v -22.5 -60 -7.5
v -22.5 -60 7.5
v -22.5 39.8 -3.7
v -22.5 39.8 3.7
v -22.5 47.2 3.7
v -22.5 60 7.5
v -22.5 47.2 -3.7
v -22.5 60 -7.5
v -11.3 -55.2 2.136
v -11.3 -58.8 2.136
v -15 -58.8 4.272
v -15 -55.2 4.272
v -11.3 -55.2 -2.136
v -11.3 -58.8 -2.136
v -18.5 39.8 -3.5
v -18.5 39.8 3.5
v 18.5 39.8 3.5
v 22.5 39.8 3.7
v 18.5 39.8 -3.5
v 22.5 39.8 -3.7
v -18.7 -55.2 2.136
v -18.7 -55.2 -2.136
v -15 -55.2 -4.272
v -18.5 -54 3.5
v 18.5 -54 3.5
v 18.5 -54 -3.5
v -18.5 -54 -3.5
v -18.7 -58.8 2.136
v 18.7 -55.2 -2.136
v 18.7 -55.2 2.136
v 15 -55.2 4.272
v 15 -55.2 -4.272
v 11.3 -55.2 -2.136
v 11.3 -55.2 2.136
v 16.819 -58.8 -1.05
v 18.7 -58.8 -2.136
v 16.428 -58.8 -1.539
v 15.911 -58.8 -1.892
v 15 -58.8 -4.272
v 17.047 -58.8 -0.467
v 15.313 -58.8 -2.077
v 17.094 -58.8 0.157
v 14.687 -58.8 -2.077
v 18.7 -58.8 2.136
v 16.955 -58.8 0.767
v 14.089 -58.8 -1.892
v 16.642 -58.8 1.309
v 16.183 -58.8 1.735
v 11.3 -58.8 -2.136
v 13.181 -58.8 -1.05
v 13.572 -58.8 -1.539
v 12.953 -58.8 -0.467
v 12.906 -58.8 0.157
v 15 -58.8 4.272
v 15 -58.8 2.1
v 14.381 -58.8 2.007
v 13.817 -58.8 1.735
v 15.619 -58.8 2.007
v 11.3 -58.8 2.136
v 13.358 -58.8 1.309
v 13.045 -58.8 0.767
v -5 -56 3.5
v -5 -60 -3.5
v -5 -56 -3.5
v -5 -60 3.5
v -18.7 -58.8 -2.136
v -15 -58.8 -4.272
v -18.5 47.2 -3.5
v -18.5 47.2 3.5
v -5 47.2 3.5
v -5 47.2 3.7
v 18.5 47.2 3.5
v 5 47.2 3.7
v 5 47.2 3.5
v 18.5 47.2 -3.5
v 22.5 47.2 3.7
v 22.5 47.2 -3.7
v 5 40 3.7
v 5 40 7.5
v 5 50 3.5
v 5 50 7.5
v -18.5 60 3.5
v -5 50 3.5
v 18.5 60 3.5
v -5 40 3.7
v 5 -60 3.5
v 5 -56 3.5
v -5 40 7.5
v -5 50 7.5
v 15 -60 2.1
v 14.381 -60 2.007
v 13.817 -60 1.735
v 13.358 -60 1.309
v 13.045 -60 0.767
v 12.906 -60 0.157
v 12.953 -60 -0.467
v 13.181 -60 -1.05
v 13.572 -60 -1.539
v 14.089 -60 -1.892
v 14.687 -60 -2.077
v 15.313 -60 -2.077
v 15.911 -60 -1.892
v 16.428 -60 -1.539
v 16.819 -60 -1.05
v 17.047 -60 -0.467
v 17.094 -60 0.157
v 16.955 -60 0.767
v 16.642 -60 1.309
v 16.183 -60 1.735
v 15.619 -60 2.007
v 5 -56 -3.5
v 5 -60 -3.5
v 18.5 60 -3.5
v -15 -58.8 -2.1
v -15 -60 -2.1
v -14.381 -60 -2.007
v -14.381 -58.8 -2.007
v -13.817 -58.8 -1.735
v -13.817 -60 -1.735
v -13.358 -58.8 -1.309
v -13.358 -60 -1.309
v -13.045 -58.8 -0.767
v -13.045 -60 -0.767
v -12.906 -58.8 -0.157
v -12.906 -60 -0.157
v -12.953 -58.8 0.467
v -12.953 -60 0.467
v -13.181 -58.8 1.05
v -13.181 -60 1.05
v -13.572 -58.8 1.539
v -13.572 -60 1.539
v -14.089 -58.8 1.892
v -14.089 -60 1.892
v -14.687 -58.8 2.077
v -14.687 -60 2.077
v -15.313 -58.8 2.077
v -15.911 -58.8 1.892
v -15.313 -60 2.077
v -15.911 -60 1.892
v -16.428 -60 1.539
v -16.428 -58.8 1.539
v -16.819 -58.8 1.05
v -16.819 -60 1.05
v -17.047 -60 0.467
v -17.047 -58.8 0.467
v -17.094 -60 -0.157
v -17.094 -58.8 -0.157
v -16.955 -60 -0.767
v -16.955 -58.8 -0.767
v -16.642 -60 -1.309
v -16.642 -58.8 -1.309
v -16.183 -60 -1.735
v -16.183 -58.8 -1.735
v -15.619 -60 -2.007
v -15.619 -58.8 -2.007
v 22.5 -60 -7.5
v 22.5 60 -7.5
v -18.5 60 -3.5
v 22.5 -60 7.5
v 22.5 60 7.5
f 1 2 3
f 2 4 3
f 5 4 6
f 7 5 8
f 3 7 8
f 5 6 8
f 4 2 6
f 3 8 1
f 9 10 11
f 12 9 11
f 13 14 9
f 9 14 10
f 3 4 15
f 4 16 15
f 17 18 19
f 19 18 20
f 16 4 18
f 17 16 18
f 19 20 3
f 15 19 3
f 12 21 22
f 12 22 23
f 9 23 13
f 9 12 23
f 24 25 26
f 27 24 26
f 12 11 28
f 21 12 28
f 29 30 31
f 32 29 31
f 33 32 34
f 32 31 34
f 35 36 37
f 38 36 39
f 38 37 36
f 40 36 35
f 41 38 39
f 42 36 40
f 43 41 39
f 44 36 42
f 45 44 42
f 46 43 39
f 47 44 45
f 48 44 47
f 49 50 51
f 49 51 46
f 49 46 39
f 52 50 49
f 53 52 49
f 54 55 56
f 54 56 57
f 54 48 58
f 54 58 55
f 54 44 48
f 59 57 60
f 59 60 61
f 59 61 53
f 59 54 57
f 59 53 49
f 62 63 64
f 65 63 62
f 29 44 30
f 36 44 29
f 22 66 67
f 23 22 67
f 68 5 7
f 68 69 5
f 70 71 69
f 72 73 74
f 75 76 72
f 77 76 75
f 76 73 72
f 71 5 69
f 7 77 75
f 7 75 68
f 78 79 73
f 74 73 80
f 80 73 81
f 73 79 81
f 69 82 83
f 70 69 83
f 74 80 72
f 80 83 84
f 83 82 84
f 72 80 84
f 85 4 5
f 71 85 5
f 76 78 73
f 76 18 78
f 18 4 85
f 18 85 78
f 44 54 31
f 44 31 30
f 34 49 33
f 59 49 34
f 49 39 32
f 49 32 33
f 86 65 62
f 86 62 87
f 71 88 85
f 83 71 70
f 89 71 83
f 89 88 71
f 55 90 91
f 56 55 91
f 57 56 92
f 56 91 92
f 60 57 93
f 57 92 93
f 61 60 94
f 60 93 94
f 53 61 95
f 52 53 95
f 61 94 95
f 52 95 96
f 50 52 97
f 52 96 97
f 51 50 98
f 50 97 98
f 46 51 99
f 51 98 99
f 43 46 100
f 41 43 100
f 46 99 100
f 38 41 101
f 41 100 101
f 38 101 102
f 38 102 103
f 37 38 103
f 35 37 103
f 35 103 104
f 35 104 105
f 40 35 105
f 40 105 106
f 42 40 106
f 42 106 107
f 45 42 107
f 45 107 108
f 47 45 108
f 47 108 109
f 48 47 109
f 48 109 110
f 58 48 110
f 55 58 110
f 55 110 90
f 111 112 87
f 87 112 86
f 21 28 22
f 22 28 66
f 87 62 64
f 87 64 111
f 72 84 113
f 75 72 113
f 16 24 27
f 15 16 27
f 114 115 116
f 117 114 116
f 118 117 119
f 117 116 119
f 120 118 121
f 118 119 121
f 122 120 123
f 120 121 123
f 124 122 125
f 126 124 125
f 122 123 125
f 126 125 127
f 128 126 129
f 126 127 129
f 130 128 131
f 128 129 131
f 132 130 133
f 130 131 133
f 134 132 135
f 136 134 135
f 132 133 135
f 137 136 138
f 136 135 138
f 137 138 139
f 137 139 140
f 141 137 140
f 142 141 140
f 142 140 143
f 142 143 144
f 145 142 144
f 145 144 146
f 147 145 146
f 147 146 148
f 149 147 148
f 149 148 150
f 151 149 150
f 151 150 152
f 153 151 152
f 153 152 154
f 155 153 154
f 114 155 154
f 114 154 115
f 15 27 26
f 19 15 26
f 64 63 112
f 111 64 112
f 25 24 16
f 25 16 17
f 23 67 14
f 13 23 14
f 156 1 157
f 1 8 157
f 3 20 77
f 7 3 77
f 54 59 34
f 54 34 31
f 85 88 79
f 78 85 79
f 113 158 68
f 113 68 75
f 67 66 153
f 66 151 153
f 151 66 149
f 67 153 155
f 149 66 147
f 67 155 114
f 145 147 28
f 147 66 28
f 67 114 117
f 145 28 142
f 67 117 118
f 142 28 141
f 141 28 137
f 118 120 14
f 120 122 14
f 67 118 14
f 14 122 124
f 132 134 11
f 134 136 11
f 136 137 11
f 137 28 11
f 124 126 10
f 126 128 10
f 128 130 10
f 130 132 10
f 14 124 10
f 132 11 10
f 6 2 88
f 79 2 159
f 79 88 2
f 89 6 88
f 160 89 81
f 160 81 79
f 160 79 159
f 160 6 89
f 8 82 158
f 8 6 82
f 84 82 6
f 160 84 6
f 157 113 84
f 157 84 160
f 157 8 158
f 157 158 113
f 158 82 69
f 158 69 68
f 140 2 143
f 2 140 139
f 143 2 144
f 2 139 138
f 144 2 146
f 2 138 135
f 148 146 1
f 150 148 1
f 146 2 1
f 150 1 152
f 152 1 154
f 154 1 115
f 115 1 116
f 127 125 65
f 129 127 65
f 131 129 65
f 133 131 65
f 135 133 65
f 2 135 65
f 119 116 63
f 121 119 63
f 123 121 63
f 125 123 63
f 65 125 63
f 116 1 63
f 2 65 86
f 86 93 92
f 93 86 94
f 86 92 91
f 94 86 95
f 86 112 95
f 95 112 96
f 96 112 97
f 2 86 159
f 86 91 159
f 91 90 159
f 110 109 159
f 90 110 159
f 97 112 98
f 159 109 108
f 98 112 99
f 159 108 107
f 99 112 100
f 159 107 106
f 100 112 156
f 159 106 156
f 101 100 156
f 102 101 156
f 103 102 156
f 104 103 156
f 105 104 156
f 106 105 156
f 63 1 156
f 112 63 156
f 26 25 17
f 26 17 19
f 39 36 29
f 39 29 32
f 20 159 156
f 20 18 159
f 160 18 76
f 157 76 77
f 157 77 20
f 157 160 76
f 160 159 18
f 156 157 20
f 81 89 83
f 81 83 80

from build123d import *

# Parameters (mm, degrees)
SKETCH1_W                 = 45
SKETCH1_H                 = 15
BOSS_EXTRUDE1_DEPTH       = 60
SHELL1_T                  = -4
SHELL1_THICKNESS_2_FACE_W = 7
SHELL1_THICKNESS_2_FACE_H = 37
SHELL1_THICKNESS_2_DEPTH  = 2
SKETCH3_W                 = 10
SKETCH3_H                 = 7
CUT_EXTRUDE2_DEPTH        = 4
CUT_EXTRUDE3_REACH        = 67.812
SKETCH4_W                 = 10
SKETCH4_H                 = 10
SKETCH5_W                 = 7.4
SKETCH5_H                 = 7.4
CUT_EXTRUDE4_DEPTH        = 76.374067158
CUT_EXTRUDE5_START        = -1.2
CUT_EXTRUDE5_DEPTH        = 3.6
CUT_EXTRUDE6_REACH        = 124.321
SKETCH7_R                 = 2.1


with BuildPart() as part:
    # Sketch1 → Boss-Extrude1 (new, symmetric)
    with BuildSketch(Plane(origin=(0, 0, 0), x_dir=(1, 0, 0), z_dir=(0, 1, 0))):
        Rectangle(SKETCH1_W, SKETCH1_H)
    extrude(amount=BOSS_EXTRUDE1_DEPTH, both=True)

    # Shell1
    shell1_openings = [part.faces().sort_by_distance(p)[0] for p in [
        (0, 60, 0),
    ]]
    offset(amount=SHELL1_T, openings=shell1_openings, kind=Kind.INTERSECTION)

    # Shell1 thickness 2 face (on inner face of the shell) → Shell1 thickness 2 (add)
    with BuildSketch(Plane(origin=(0, -56, 0), x_dir=(0, 0, -1), z_dir=(0, -1, 0))):
        Rectangle(SHELL1_THICKNESS_2_FACE_W, SHELL1_THICKNESS_2_FACE_H)
    extrude(amount=-SHELL1_THICKNESS_2_DEPTH)

    # Sketch3 → Cut-Extrude2 (cut)
    with BuildSketch(Plane.XZ.offset(60)):
        Rectangle(SKETCH3_W, SKETCH3_H)
    extrude(amount=-CUT_EXTRUDE2_DEPTH, mode=Mode.SUBTRACT)

    # Sketch4 → Cut-Extrude3 (cut, up to next)
    with BuildSketch(Plane.XY.offset(7.5), mode=Mode.PRIVATE) as cut_extrude3_sk1:
        with Locations((0, 45)):
            Rectangle(SKETCH4_W, SKETCH4_H)
    cut_extrude3_tool1 = extrude(cut_extrude3_sk1.sketch, amount=-CUT_EXTRUDE3_REACH, mode=Mode.PRIVATE) & part.part
    add(cut_extrude3_tool1.solids().sort_by_distance((0, 45, 7.5))[0], mode=Mode.SUBTRACT)

    # Sketch5 → Cut-Extrude4 (cut, through all)
    with BuildSketch(Plane(origin=(22.5, 0, 0), x_dir=(0, 0, -1), z_dir=(1, 0, 0))):
        with Locations((0, 43.5)):
            Rectangle(SKETCH5_W, SKETCH5_H)
    extrude(amount=-CUT_EXTRUDE4_DEPTH, mode=Mode.SUBTRACT)

    # Sketch6 → Cut-Extrude5 (cut)
    with BuildSketch(Plane.XZ.offset(60).offset(CUT_EXTRUDE5_START)):
        Polygon((-15, 4.272391992), (-18.7, 2.136195996), (-18.7, -2.136195996), (-15, -4.272391992), (-11.3, -2.136195996), (-11.3, 2.136195996), align=None)
        Polygon((11.3, 2.136195996), (15, 4.272391992), (18.7, 2.136195996), (18.7, -2.136195996), (15, -4.272391992), (11.3, -2.136195996), align=None)
    extrude(amount=-CUT_EXTRUDE5_DEPTH, mode=Mode.SUBTRACT)

    # Sketch7 → Cut-Extrude6 (cut, up to next)
    with BuildSketch(Plane.XZ.offset(60), mode=Mode.PRIVATE) as cut_extrude6_sk1:
        with Locations(Location((-15, 0, 0), (0, 0, 270))):
            Circle(SKETCH7_R)
    cut_extrude6_tool1 = extrude(cut_extrude6_sk1.sketch, amount=-CUT_EXTRUDE6_REACH, mode=Mode.PRIVATE) & part.part
    # Sketch7 → Cut-Extrude6 (cut, up to next)
    with BuildSketch(Plane.XZ.offset(60), mode=Mode.PRIVATE) as cut_extrude6_sk2:
        with Locations(Location((15, 0, 0), (0, 0, 90))):
            Circle(SKETCH7_R)
    cut_extrude6_tool2 = extrude(cut_extrude6_sk2.sketch, amount=-CUT_EXTRUDE6_REACH, mode=Mode.PRIVATE) & part.part
    add(cut_extrude6_tool1.solids().sort_by_distance((-15, -60, 0))[0], mode=Mode.SUBTRACT)
    add(cut_extrude6_tool2.solids().sort_by_distance((15, -60, 0))[0], mode=Mode.SUBTRACT)


solid = part.part
